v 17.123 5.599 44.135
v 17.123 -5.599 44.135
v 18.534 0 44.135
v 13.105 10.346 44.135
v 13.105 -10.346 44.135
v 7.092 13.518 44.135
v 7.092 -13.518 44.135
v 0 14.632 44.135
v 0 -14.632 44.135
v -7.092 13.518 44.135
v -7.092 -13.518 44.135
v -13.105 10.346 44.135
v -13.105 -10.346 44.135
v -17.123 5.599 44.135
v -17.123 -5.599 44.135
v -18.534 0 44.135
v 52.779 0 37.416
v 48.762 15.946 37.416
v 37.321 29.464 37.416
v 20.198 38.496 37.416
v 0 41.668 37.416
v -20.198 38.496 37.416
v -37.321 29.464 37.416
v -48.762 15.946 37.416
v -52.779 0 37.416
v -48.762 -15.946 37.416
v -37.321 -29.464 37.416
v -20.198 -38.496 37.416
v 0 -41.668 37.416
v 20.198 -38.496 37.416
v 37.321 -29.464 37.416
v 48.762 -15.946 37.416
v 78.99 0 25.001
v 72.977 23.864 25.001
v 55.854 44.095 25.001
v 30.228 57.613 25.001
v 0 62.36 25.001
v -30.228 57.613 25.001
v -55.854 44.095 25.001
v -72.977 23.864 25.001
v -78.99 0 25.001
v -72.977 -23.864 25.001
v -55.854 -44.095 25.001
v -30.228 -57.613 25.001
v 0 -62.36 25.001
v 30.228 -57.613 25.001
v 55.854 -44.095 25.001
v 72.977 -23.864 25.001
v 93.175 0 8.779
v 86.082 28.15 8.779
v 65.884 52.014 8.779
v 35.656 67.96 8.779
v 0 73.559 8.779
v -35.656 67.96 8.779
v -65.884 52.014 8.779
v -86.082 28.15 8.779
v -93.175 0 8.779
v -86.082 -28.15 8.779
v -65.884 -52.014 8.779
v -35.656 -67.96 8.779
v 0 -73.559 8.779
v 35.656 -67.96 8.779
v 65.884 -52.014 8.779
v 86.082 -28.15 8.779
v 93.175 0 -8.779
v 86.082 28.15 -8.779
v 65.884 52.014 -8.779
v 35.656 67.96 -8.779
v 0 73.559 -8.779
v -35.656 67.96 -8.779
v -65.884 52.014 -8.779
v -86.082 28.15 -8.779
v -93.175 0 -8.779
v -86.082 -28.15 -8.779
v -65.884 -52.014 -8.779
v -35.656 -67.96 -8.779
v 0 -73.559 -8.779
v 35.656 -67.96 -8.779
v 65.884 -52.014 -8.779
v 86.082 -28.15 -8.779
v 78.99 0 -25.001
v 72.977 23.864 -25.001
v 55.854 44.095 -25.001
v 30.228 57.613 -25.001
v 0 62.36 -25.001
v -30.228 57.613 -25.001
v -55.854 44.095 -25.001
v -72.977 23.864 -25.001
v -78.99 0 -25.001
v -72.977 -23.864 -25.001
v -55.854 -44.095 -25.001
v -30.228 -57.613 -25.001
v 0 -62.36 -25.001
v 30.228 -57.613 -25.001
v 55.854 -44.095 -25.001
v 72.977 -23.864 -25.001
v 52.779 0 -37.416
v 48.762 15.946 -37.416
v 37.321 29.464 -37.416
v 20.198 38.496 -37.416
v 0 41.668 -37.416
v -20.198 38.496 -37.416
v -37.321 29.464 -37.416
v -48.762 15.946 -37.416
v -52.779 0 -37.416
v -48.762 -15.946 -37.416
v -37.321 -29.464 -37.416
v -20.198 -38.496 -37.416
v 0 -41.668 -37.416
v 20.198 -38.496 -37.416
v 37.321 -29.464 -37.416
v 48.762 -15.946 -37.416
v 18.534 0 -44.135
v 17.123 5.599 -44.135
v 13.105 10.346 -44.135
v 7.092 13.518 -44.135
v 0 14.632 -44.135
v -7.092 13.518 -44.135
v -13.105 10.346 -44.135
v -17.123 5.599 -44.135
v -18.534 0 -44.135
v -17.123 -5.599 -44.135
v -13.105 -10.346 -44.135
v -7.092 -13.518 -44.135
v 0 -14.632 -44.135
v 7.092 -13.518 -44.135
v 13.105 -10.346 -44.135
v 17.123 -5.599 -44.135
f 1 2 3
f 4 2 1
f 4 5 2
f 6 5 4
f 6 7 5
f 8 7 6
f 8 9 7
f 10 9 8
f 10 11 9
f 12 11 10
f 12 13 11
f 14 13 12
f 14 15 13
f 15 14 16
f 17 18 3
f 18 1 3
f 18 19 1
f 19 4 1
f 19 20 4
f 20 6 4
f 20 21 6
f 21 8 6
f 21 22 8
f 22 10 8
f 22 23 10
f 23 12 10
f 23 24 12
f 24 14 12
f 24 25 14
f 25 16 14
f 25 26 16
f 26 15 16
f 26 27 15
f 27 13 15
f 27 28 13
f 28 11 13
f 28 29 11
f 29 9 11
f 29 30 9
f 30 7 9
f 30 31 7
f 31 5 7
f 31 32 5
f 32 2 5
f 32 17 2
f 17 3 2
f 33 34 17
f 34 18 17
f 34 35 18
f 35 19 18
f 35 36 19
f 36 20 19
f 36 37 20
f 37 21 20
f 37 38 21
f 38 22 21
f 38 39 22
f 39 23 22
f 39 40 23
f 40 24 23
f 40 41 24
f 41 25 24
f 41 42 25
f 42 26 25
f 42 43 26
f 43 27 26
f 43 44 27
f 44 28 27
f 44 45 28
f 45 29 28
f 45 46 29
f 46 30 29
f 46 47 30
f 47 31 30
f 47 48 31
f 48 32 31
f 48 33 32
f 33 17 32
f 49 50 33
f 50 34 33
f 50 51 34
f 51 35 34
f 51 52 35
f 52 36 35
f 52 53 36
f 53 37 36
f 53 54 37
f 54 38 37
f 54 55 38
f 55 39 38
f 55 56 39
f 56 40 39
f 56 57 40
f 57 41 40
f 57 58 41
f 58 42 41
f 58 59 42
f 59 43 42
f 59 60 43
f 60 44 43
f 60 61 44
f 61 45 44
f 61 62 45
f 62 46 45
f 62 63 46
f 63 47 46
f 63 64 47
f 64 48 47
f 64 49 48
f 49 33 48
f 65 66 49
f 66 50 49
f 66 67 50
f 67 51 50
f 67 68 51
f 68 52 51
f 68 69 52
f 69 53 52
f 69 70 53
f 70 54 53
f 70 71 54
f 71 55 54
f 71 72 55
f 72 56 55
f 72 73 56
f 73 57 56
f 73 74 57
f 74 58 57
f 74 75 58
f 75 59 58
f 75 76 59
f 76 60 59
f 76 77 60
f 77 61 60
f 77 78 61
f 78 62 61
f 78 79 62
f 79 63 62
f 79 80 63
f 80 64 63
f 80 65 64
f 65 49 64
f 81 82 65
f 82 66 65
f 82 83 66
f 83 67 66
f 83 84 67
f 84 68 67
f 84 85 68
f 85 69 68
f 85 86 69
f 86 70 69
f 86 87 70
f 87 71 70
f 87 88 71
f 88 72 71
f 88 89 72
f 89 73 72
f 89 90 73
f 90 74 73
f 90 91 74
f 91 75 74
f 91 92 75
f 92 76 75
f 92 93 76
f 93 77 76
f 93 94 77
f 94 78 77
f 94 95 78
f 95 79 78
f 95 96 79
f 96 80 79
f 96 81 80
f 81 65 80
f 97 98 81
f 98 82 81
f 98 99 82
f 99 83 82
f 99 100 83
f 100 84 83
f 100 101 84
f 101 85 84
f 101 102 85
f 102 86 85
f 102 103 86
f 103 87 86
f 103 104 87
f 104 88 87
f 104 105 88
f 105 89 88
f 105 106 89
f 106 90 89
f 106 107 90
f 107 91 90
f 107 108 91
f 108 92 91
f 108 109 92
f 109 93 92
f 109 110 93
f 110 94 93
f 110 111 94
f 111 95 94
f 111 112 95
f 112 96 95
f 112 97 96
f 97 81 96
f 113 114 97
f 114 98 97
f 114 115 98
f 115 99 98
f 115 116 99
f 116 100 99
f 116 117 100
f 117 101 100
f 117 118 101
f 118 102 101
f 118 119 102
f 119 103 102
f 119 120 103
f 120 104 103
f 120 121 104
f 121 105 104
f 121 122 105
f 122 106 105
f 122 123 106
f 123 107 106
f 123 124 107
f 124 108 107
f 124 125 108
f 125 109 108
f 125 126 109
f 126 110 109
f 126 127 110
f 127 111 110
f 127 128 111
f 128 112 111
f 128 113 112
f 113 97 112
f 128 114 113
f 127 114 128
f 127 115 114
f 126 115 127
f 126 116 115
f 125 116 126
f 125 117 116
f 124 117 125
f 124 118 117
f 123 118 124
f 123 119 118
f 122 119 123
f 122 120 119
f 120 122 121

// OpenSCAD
// Generated by SolidPython 1.0.1 on 2020-07-29 00:46:54


scale(v = [19, 15, 9]) {
	sphere(r = 5);
}
/***********************************************
*********      SolidPython code:      **********
************************************************
 
# import packages: SolidPython
from solid import *
from solid.utils import *
from itertools import chain, combinations, permutations


class Resize:

    def __init__(self, scad_file):
        self.scad_file = scad_file
        #self.scad_file = import_scad(scad_file)
        # cone/cylinder param:
        self.r1 = 0
        self.r2 = 0
        self.h = 0
        # rectangular prism param:
        self.w = 0
        self.l = 0
        # ellipse param:
        self.r = 0

    # import OpenScad code (file name corresponds to shape)


    # classify shape + parameters
    def assign(self, param1, param2, param3):
        if self.scad_file == 'cone.scad':
            self.r1 = param1
            self.r2 = param2
            self.h = param3
        elif self.scad_file == 'cylinder.scad':
            self.r1 = param1
            self.r2 = param2
            self.h = param3
        elif self.scad_file == 'rectangularPrism.scad':
            self.h = param1
            self.l = param2
            self.w = param3
        else:
            self.r = param1
            self.h = param2

    # resize parameters
    def iterate(self):
        x = range(3, 20, 2)
        i = 1
        if self.scad_file == 'cone.scad':
            tempList = list(permutations(x, 2))
            for temp in tempList:
                param1 = temp[0]
                param2 = temp[1]
                filepath = 'produced_scad_files/' + 'cone' + str(param1) + '_' + str(param2) + '_' + '.scad'
                scad_render_to_file(cylinder(h=param1, r1=param2, r2=0), filepath)

        elif self.scad_file == 'cylinder.scad':
            tempList = list(permutations(x, 3))
            for temp in tempList:
                param1 = temp[0]
                param2 = temp[1]
                filepath = 'produced_scad_files/' + 'cylinder' + str(param1) + '_' + str(param2) + '_' + '.scad'
                scad_render_to_file(cylinder(h=param1, r1=param2, r2=param2), filepath)

        elif self.scad_file == 'rectangularPrism.scad':
            tempList = list(permutations(x, 3))
            for temp in tempList:
                param1 = temp[0]
                param2 = temp[1]
                param3 = temp[2]
                filepath = 'produced_scad_files/' + 'rectangularPrism' + str(param1) + '_' + str(param2) + '_' + str(
                    param3) + '.scad'
                scad_render_to_file(cube(size=(param1, param2, param3)), filepath)

        elif self.scad_file == 'ellipse.scad':
            tempList = list(permutations(x, 4))
            for temp in tempList:
                param1 = temp[0]
                param2 = temp[1]
                param3 = temp[2]
                param4 = temp[3]
                filepath = 'produced_scad_files/' + 'ellipse' + str(param1) + '_' + str(param2) + '_' + str(param3) + '_' + str(param4) + '.scad'
                scad_render_to_file(scale([param1, param2, param3])(sphere(r=param4)), filepath)

    def render_to_scadfile(self):
        scad_render_to_file(scad, 'example.scad') 
 
************************************************/
